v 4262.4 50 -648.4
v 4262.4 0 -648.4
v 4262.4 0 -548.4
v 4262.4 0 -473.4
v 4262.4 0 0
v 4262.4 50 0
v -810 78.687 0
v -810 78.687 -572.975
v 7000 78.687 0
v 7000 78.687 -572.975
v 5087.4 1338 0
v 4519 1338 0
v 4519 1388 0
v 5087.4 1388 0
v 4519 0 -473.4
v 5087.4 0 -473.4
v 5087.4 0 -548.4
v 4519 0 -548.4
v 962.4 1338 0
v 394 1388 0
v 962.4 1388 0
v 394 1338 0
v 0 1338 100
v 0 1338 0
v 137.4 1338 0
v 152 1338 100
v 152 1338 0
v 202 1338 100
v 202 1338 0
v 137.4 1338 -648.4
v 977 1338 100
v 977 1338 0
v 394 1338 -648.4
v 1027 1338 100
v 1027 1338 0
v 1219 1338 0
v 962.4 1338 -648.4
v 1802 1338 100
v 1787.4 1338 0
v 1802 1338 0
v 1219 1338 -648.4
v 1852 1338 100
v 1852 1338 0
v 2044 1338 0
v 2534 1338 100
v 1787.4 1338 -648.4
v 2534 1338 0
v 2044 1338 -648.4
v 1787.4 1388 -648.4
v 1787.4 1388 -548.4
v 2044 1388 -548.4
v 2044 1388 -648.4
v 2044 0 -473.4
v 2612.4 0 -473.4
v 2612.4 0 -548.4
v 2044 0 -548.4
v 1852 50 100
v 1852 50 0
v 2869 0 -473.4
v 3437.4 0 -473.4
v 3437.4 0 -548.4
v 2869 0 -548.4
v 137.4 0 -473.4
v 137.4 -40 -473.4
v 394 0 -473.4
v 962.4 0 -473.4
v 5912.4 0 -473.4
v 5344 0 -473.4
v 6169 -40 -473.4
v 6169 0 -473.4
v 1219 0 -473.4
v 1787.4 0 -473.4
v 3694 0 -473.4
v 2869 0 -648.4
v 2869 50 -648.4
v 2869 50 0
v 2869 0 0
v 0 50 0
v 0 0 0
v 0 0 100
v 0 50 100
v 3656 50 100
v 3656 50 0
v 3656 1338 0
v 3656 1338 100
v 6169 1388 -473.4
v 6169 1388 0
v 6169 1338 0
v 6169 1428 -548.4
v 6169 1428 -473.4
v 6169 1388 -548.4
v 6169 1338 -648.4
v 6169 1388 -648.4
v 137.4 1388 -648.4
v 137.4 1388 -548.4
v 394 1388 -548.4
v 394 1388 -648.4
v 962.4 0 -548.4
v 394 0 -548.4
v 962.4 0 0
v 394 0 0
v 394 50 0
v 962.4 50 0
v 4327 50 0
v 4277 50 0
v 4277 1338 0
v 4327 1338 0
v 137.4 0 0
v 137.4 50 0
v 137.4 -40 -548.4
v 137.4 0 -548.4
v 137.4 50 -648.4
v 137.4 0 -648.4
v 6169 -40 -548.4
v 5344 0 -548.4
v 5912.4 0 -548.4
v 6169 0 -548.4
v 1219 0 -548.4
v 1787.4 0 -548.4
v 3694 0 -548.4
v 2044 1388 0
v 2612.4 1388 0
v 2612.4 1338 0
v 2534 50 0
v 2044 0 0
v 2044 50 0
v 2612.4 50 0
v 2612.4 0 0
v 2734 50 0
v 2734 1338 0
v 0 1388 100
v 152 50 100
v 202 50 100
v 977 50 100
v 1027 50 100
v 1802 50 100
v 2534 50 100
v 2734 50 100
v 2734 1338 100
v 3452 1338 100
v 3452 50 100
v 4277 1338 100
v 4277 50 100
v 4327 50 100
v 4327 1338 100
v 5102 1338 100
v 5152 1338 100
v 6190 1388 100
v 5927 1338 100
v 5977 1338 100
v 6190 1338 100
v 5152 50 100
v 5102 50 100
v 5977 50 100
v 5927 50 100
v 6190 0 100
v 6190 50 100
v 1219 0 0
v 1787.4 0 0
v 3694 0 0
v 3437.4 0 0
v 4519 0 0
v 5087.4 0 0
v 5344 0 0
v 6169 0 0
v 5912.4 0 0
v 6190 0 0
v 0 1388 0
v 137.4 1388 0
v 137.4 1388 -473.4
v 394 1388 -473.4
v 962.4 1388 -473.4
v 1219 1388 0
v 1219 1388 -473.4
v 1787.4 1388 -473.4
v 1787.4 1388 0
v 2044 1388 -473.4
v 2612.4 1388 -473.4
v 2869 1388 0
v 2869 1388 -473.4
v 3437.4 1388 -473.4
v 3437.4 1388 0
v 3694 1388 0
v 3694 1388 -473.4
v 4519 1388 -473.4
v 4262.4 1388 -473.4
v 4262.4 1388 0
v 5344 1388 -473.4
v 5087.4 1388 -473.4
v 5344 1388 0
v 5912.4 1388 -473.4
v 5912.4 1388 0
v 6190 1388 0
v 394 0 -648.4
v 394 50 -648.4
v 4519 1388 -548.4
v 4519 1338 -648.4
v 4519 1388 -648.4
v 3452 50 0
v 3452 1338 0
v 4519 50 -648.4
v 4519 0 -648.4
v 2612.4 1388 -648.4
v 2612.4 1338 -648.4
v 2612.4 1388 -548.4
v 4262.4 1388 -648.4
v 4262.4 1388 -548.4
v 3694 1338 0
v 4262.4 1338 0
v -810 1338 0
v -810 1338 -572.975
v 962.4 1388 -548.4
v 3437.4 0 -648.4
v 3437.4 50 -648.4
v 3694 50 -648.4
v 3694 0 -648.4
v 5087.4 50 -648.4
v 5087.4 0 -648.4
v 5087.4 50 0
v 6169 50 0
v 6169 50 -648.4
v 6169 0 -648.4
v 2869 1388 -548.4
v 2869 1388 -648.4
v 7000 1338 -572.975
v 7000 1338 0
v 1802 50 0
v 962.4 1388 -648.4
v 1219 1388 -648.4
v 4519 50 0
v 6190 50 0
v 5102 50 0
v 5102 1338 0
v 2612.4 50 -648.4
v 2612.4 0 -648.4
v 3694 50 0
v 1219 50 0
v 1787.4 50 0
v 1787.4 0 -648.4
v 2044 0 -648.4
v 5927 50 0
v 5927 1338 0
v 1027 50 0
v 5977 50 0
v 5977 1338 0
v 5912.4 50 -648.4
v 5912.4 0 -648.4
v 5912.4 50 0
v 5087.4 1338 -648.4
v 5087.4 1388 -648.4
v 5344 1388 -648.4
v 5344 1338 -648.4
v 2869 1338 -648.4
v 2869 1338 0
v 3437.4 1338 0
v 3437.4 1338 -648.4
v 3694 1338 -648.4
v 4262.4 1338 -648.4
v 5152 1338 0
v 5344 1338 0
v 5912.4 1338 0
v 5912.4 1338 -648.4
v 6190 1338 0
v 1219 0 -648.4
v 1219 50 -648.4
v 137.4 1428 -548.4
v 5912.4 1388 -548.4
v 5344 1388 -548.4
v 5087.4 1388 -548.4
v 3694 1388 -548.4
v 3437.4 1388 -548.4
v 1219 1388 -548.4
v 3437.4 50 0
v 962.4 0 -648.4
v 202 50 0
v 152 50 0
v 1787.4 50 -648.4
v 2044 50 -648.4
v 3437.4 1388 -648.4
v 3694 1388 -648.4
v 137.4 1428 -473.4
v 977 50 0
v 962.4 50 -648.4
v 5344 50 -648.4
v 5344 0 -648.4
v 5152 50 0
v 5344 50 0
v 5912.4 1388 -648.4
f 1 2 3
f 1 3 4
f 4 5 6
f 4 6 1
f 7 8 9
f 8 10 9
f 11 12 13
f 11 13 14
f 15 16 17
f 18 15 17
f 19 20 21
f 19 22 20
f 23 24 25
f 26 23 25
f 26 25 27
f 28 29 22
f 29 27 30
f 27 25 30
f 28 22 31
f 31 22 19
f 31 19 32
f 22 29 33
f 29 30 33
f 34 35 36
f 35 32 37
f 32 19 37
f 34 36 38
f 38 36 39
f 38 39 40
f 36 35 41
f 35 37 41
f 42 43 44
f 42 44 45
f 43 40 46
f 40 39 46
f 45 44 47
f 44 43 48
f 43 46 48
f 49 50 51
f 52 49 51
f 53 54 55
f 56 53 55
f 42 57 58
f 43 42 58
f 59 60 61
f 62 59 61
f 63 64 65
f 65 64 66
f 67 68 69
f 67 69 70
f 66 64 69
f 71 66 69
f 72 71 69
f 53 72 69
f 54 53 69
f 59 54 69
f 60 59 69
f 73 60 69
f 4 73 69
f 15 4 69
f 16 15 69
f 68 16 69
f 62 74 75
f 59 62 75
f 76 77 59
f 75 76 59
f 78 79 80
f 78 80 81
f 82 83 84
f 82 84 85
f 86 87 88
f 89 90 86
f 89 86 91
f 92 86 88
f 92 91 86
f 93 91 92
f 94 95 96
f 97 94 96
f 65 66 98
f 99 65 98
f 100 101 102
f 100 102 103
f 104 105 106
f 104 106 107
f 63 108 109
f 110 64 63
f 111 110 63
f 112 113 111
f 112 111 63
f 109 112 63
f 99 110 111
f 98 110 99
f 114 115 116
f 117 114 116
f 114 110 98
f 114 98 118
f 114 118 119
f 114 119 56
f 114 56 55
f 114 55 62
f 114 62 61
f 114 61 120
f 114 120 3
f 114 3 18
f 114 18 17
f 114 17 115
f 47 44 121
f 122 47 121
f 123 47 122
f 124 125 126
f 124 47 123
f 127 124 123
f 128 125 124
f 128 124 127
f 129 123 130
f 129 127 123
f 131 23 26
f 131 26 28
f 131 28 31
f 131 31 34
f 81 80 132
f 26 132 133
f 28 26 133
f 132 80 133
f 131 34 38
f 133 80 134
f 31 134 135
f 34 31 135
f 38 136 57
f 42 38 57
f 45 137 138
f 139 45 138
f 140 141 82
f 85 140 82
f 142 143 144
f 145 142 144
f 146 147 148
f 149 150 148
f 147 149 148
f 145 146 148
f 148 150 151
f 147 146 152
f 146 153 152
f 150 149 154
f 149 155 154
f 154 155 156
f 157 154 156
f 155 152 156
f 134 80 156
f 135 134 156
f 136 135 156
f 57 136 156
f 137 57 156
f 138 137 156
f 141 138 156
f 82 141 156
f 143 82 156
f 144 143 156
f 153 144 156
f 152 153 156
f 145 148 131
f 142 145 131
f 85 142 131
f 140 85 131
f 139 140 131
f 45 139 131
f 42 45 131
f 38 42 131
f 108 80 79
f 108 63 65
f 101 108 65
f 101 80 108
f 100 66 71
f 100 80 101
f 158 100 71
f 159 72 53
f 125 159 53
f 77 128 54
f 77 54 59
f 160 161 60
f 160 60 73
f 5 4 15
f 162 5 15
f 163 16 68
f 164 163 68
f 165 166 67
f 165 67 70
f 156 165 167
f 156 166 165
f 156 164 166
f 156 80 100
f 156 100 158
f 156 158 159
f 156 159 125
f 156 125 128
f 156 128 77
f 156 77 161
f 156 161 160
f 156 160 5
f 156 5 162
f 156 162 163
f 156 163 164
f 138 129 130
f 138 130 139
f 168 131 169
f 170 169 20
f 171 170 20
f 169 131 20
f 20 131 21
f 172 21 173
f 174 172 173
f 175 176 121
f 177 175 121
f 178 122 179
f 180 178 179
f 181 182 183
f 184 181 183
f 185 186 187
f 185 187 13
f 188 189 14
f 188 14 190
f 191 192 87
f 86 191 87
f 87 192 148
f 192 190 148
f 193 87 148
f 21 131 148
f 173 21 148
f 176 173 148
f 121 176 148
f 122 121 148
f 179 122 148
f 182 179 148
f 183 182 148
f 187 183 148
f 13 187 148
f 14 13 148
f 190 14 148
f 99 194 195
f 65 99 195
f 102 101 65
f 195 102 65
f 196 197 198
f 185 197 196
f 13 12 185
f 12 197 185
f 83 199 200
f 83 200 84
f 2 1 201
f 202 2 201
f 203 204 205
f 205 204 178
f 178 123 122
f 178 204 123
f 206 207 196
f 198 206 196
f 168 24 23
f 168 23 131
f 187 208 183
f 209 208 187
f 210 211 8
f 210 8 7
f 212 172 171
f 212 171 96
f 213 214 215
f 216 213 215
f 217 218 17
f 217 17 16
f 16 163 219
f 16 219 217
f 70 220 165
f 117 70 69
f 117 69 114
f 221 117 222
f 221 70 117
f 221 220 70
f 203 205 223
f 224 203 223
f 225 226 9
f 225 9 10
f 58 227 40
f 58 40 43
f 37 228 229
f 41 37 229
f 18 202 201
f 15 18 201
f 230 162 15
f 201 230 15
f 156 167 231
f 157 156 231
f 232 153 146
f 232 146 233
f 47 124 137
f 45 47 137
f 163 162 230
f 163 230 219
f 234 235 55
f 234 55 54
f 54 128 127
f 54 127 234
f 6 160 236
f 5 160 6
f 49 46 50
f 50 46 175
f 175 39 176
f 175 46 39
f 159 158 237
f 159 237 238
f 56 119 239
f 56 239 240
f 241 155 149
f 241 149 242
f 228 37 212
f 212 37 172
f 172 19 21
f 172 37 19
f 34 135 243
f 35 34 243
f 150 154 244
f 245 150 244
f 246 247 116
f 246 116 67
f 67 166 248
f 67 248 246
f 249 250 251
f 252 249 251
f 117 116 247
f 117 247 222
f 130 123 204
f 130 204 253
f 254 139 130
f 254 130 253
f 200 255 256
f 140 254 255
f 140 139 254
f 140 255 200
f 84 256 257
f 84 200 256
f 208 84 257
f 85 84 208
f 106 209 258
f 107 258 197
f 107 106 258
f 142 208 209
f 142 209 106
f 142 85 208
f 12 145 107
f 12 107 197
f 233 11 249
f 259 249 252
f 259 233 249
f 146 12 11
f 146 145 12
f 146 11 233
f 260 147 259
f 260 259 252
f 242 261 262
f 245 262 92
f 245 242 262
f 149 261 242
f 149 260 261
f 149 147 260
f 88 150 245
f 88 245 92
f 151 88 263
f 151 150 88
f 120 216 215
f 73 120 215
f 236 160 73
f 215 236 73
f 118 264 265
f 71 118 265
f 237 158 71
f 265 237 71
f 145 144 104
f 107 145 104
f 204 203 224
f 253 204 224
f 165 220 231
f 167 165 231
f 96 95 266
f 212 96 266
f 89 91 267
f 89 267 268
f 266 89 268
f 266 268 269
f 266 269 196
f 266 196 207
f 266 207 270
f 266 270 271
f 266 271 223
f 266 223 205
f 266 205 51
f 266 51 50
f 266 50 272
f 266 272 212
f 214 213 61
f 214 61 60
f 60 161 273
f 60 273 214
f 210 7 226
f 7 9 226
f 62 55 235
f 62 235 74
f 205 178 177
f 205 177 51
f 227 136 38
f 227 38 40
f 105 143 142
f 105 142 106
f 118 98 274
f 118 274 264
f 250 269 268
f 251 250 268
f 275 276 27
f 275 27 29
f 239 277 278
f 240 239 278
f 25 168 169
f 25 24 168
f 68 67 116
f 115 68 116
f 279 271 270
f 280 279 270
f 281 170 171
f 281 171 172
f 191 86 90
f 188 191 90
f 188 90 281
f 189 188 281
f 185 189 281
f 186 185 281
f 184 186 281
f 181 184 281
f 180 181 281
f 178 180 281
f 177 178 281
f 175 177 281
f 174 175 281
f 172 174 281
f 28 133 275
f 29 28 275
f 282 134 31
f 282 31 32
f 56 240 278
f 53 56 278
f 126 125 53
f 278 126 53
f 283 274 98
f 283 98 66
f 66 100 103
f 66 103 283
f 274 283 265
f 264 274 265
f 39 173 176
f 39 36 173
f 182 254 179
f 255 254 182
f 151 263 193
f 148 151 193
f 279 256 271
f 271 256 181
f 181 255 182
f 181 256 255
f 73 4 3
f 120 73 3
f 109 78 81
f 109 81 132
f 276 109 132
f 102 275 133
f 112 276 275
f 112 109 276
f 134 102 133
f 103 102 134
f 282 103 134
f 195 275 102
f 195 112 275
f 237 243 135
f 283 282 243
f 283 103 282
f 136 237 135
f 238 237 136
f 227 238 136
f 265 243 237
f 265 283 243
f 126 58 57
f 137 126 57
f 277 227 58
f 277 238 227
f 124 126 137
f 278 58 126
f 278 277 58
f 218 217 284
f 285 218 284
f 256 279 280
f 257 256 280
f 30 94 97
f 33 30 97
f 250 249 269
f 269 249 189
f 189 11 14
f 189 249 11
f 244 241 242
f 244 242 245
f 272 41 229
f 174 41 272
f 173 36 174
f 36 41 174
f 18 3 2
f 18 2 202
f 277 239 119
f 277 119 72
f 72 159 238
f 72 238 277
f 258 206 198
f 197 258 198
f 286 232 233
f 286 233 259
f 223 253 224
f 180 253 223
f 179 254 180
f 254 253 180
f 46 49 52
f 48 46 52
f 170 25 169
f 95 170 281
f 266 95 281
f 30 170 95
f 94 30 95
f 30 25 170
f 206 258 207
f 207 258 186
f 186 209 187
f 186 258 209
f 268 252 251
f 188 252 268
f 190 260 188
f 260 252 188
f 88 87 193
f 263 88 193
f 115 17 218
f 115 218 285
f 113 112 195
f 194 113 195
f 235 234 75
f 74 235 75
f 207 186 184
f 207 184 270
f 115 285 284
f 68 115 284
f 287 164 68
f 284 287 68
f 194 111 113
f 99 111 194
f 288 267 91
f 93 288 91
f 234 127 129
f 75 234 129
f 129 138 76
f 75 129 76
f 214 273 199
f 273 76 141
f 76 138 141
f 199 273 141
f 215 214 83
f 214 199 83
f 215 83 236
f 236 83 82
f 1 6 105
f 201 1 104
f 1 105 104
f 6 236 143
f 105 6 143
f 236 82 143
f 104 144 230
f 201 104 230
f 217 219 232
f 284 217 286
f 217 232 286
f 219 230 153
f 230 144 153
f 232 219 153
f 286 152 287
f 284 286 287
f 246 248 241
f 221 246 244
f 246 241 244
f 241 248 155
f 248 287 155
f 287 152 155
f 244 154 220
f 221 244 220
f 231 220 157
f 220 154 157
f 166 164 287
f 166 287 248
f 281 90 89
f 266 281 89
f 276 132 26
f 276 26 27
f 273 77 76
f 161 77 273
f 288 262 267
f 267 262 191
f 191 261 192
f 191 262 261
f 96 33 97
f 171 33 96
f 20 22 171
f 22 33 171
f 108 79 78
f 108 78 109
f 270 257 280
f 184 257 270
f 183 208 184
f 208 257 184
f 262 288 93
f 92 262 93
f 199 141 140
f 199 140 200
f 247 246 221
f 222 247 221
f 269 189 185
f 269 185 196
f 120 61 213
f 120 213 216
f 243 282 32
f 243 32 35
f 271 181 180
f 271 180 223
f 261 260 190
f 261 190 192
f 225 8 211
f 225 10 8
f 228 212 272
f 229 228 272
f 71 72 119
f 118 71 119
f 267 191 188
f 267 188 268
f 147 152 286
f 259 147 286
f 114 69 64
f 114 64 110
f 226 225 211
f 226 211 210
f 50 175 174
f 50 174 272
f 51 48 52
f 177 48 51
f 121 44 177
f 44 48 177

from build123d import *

# Parameters (mm, degrees)
SKETCH1_W             = 6190
SKETCH1_H             = 50
BOSS_EXTRUDE1_DEPTH   = 100
BOSS_EXTRUDE1_2_DEPTH = 100
SKETCH2_W             = 200
SKETCH2_H             = 100
BOSS_EXTRUDE2_DEPTH   = 1388
SKETCH4_W             = 50
SKETCH4_H             = 100
BOSS_EXTRUDE3_DEPTH   = 1288
SKETCH5_W             = 256.6
SKETCH5_H             = 50
BOSS_EXTRUDE4_DEPTH   = 648.4
BOSS_EXTRUDE12_REACH  = 6358.377
SKETCH13_W            = 75
SKETCH13_H            = 40
SKETCH11_W            = 572.975396728
SKETCH11_H            = 1259.313187421
BOSS_EXTRUDE10_DEPTH  = 7000
SKETCH12_W            = 572.975396728
SKETCH12_H            = 1259.313187421
BOSS_EXTRUDE11_DEPTH  = 810


with BuildPart() as part:
    # Sketch1 → Boss-Extrude1 (new body)
    with BuildSketch(Plane.XY):
        with Locations((3095, 1363)):
            Rectangle(SKETCH1_W, SKETCH1_H)
    extrude(amount=BOSS_EXTRUDE1_DEPTH)



with BuildPart() as body_2:
    # Sketch1 → Boss-Extrude1 2 (new body)
    with BuildSketch(Plane.XY):
        with Locations((3095, 25)):
            Rectangle(SKETCH1_W, SKETCH1_H)
    extrude(amount=BOSS_EXTRUDE1_2_DEPTH)


with BuildPart() as part_1:
    add(part.part)

    add(body_2.part)  # Boss-Extrude2 merges body 2
    # Sketch2 → Boss-Extrude2 (add)
    with BuildSketch(Plane.XZ):
        with Locations((2634, 50)):
            Rectangle(SKETCH2_W, SKETCH2_H)
        with Locations((3556, 50)):
            Rectangle(SKETCH2_W, SKETCH2_H)
    extrude(amount=-BOSS_EXTRUDE2_DEPTH)

    # Sketch4 → Boss-Extrude3 (add)
    with BuildSketch(Plane(origin=(0, 50, 0), x_dir=(1, 0, 0), z_dir=(0, 1, 0))):
        with Locations((177, -50)):
            Rectangle(SKETCH4_W, SKETCH4_H)
        with Locations((1002, -50)):
            Rectangle(SKETCH4_W, SKETCH4_H)
        with Locations((1827, -50)):
            Rectangle(SKETCH4_W, SKETCH4_H)
        with Locations((2652, -50)):
            Rectangle(SKETCH4_W, SKETCH4_H)
        with Locations((3477, -50)):
            Rectangle(SKETCH4_W, SKETCH4_H)
        with Locations((4302, -50)):
            Rectangle(SKETCH4_W, SKETCH4_H)
        with Locations((5127, -50)):
            Rectangle(SKETCH4_W, SKETCH4_H)
        with Locations((5952, -50)):
            Rectangle(SKETCH4_W, SKETCH4_H)
    extrude(amount=BOSS_EXTRUDE3_DEPTH)

    # Sketch5 → Boss-Extrude4 (add)
    with BuildSketch(Plane.XY):
        with Locations((6040.7, 1363)):
            Rectangle(SKETCH5_W, SKETCH5_H)
        with Locations((265.7, 1363)):
            Rectangle(SKETCH5_W, SKETCH5_H)
        with Locations((265.7, 25)):
            Rectangle(SKETCH5_W, SKETCH5_H)
        with Locations((6040.7, 25)):
            Rectangle(SKETCH5_W, SKETCH5_H)
        with Locations((5215.7, 25)):
            Rectangle(SKETCH5_W, SKETCH5_H)
        with Locations((1090.7, 1363)):
            Rectangle(SKETCH5_W, SKETCH5_H)
        with Locations((4390.7, 25)):
            Rectangle(SKETCH5_W, SKETCH5_H)
        with Locations((1915.7, 1363)):
            Rectangle(SKETCH5_W, SKETCH5_H)
        with Locations((3565.7, 25)):
            Rectangle(SKETCH5_W, SKETCH5_H)
        with Locations((2740.7, 1363)):
            Rectangle(SKETCH5_W, SKETCH5_H)
        with Locations((2740.7, 25)):
            Rectangle(SKETCH5_W, SKETCH5_H)
        with Locations((3565.7, 1363)):
            Rectangle(SKETCH5_W, SKETCH5_H)
        with Locations((1915.7, 25)):
            Rectangle(SKETCH5_W, SKETCH5_H)
        with Locations((1090.7, 25)):
            Rectangle(SKETCH5_W, SKETCH5_H)
        with Locations((4390.7, 1363)):
            Rectangle(SKETCH5_W, SKETCH5_H)
        with Locations((5215.7, 1363)):
            Rectangle(SKETCH5_W, SKETCH5_H)
    extrude(amount=-BOSS_EXTRUDE4_DEPTH)

    # Boss-Extrude12: up to this face of the body (flat: up to its plane)
    boss_extrude12_end = Plane(part_1.part.faces().sort_by_distance((137.4, 1363, -324.2))[0])
    # Sketch13 → Boss-Extrude12 (add, up to the picked face)
    with BuildSketch(Plane(origin=(6169, 0, 0), x_dir=(0, 0, -1), z_dir=(1, 0, 0)), mode=Mode.PRIVATE) as boss_extrude12_sk1:
        with Locations((510.9, -20)):
            Rectangle(SKETCH13_W, SKETCH13_H)
    boss_extrude12_tool1 = split(extrude(boss_extrude12_sk1.sketch, amount=-BOSS_EXTRUDE12_REACH, mode=Mode.PRIVATE), bisect_by=boss_extrude12_end, keep=Keep.BOTH, mode=Mode.PRIVATE)
    # Sketch13 → Boss-Extrude12 (add, up to the picked face)
    with BuildSketch(Plane(origin=(6169, 0, 0), x_dir=(0, 0, -1), z_dir=(1, 0, 0)), mode=Mode.PRIVATE) as boss_extrude12_sk2:
        with Locations((510.9, 1408)):
            Rectangle(SKETCH13_W, SKETCH13_H)
    boss_extrude12_tool2 = split(extrude(boss_extrude12_sk2.sketch, amount=-BOSS_EXTRUDE12_REACH, mode=Mode.PRIVATE), bisect_by=boss_extrude12_end, keep=Keep.BOTH, mode=Mode.PRIVATE)
    add(boss_extrude12_tool1.solids().sort_by(Axis((6169, -20, -510.9), (-1, 0, 0)))[0])
    add(boss_extrude12_tool2.solids().sort_by(Axis((6169, 1408, -510.9), (-1, 0, 0)))[0])


with BuildPart() as body_2_2:
    # Sketch11 → Boss-Extrude10 (new body)
    with BuildSketch(Plane(origin=(0, 0, 0), x_dir=(0, 0, -1), z_dir=(1, 0, 0))):
        with Locations((286.487698364, 708.343406289)):
            Rectangle(SKETCH11_W, SKETCH11_H)
    extrude(amount=BOSS_EXTRUDE10_DEPTH)

    # Sketch12 → Boss-Extrude11 (add)
    with BuildSketch(Plane.ZY):
        with Locations((-286.487698364, 708.343406289)):
            Rectangle(SKETCH12_W, SKETCH12_H)
    extrude(amount=BOSS_EXTRUDE11_DEPTH)


solid = Compound([part_1.part, body_2_2.part])
